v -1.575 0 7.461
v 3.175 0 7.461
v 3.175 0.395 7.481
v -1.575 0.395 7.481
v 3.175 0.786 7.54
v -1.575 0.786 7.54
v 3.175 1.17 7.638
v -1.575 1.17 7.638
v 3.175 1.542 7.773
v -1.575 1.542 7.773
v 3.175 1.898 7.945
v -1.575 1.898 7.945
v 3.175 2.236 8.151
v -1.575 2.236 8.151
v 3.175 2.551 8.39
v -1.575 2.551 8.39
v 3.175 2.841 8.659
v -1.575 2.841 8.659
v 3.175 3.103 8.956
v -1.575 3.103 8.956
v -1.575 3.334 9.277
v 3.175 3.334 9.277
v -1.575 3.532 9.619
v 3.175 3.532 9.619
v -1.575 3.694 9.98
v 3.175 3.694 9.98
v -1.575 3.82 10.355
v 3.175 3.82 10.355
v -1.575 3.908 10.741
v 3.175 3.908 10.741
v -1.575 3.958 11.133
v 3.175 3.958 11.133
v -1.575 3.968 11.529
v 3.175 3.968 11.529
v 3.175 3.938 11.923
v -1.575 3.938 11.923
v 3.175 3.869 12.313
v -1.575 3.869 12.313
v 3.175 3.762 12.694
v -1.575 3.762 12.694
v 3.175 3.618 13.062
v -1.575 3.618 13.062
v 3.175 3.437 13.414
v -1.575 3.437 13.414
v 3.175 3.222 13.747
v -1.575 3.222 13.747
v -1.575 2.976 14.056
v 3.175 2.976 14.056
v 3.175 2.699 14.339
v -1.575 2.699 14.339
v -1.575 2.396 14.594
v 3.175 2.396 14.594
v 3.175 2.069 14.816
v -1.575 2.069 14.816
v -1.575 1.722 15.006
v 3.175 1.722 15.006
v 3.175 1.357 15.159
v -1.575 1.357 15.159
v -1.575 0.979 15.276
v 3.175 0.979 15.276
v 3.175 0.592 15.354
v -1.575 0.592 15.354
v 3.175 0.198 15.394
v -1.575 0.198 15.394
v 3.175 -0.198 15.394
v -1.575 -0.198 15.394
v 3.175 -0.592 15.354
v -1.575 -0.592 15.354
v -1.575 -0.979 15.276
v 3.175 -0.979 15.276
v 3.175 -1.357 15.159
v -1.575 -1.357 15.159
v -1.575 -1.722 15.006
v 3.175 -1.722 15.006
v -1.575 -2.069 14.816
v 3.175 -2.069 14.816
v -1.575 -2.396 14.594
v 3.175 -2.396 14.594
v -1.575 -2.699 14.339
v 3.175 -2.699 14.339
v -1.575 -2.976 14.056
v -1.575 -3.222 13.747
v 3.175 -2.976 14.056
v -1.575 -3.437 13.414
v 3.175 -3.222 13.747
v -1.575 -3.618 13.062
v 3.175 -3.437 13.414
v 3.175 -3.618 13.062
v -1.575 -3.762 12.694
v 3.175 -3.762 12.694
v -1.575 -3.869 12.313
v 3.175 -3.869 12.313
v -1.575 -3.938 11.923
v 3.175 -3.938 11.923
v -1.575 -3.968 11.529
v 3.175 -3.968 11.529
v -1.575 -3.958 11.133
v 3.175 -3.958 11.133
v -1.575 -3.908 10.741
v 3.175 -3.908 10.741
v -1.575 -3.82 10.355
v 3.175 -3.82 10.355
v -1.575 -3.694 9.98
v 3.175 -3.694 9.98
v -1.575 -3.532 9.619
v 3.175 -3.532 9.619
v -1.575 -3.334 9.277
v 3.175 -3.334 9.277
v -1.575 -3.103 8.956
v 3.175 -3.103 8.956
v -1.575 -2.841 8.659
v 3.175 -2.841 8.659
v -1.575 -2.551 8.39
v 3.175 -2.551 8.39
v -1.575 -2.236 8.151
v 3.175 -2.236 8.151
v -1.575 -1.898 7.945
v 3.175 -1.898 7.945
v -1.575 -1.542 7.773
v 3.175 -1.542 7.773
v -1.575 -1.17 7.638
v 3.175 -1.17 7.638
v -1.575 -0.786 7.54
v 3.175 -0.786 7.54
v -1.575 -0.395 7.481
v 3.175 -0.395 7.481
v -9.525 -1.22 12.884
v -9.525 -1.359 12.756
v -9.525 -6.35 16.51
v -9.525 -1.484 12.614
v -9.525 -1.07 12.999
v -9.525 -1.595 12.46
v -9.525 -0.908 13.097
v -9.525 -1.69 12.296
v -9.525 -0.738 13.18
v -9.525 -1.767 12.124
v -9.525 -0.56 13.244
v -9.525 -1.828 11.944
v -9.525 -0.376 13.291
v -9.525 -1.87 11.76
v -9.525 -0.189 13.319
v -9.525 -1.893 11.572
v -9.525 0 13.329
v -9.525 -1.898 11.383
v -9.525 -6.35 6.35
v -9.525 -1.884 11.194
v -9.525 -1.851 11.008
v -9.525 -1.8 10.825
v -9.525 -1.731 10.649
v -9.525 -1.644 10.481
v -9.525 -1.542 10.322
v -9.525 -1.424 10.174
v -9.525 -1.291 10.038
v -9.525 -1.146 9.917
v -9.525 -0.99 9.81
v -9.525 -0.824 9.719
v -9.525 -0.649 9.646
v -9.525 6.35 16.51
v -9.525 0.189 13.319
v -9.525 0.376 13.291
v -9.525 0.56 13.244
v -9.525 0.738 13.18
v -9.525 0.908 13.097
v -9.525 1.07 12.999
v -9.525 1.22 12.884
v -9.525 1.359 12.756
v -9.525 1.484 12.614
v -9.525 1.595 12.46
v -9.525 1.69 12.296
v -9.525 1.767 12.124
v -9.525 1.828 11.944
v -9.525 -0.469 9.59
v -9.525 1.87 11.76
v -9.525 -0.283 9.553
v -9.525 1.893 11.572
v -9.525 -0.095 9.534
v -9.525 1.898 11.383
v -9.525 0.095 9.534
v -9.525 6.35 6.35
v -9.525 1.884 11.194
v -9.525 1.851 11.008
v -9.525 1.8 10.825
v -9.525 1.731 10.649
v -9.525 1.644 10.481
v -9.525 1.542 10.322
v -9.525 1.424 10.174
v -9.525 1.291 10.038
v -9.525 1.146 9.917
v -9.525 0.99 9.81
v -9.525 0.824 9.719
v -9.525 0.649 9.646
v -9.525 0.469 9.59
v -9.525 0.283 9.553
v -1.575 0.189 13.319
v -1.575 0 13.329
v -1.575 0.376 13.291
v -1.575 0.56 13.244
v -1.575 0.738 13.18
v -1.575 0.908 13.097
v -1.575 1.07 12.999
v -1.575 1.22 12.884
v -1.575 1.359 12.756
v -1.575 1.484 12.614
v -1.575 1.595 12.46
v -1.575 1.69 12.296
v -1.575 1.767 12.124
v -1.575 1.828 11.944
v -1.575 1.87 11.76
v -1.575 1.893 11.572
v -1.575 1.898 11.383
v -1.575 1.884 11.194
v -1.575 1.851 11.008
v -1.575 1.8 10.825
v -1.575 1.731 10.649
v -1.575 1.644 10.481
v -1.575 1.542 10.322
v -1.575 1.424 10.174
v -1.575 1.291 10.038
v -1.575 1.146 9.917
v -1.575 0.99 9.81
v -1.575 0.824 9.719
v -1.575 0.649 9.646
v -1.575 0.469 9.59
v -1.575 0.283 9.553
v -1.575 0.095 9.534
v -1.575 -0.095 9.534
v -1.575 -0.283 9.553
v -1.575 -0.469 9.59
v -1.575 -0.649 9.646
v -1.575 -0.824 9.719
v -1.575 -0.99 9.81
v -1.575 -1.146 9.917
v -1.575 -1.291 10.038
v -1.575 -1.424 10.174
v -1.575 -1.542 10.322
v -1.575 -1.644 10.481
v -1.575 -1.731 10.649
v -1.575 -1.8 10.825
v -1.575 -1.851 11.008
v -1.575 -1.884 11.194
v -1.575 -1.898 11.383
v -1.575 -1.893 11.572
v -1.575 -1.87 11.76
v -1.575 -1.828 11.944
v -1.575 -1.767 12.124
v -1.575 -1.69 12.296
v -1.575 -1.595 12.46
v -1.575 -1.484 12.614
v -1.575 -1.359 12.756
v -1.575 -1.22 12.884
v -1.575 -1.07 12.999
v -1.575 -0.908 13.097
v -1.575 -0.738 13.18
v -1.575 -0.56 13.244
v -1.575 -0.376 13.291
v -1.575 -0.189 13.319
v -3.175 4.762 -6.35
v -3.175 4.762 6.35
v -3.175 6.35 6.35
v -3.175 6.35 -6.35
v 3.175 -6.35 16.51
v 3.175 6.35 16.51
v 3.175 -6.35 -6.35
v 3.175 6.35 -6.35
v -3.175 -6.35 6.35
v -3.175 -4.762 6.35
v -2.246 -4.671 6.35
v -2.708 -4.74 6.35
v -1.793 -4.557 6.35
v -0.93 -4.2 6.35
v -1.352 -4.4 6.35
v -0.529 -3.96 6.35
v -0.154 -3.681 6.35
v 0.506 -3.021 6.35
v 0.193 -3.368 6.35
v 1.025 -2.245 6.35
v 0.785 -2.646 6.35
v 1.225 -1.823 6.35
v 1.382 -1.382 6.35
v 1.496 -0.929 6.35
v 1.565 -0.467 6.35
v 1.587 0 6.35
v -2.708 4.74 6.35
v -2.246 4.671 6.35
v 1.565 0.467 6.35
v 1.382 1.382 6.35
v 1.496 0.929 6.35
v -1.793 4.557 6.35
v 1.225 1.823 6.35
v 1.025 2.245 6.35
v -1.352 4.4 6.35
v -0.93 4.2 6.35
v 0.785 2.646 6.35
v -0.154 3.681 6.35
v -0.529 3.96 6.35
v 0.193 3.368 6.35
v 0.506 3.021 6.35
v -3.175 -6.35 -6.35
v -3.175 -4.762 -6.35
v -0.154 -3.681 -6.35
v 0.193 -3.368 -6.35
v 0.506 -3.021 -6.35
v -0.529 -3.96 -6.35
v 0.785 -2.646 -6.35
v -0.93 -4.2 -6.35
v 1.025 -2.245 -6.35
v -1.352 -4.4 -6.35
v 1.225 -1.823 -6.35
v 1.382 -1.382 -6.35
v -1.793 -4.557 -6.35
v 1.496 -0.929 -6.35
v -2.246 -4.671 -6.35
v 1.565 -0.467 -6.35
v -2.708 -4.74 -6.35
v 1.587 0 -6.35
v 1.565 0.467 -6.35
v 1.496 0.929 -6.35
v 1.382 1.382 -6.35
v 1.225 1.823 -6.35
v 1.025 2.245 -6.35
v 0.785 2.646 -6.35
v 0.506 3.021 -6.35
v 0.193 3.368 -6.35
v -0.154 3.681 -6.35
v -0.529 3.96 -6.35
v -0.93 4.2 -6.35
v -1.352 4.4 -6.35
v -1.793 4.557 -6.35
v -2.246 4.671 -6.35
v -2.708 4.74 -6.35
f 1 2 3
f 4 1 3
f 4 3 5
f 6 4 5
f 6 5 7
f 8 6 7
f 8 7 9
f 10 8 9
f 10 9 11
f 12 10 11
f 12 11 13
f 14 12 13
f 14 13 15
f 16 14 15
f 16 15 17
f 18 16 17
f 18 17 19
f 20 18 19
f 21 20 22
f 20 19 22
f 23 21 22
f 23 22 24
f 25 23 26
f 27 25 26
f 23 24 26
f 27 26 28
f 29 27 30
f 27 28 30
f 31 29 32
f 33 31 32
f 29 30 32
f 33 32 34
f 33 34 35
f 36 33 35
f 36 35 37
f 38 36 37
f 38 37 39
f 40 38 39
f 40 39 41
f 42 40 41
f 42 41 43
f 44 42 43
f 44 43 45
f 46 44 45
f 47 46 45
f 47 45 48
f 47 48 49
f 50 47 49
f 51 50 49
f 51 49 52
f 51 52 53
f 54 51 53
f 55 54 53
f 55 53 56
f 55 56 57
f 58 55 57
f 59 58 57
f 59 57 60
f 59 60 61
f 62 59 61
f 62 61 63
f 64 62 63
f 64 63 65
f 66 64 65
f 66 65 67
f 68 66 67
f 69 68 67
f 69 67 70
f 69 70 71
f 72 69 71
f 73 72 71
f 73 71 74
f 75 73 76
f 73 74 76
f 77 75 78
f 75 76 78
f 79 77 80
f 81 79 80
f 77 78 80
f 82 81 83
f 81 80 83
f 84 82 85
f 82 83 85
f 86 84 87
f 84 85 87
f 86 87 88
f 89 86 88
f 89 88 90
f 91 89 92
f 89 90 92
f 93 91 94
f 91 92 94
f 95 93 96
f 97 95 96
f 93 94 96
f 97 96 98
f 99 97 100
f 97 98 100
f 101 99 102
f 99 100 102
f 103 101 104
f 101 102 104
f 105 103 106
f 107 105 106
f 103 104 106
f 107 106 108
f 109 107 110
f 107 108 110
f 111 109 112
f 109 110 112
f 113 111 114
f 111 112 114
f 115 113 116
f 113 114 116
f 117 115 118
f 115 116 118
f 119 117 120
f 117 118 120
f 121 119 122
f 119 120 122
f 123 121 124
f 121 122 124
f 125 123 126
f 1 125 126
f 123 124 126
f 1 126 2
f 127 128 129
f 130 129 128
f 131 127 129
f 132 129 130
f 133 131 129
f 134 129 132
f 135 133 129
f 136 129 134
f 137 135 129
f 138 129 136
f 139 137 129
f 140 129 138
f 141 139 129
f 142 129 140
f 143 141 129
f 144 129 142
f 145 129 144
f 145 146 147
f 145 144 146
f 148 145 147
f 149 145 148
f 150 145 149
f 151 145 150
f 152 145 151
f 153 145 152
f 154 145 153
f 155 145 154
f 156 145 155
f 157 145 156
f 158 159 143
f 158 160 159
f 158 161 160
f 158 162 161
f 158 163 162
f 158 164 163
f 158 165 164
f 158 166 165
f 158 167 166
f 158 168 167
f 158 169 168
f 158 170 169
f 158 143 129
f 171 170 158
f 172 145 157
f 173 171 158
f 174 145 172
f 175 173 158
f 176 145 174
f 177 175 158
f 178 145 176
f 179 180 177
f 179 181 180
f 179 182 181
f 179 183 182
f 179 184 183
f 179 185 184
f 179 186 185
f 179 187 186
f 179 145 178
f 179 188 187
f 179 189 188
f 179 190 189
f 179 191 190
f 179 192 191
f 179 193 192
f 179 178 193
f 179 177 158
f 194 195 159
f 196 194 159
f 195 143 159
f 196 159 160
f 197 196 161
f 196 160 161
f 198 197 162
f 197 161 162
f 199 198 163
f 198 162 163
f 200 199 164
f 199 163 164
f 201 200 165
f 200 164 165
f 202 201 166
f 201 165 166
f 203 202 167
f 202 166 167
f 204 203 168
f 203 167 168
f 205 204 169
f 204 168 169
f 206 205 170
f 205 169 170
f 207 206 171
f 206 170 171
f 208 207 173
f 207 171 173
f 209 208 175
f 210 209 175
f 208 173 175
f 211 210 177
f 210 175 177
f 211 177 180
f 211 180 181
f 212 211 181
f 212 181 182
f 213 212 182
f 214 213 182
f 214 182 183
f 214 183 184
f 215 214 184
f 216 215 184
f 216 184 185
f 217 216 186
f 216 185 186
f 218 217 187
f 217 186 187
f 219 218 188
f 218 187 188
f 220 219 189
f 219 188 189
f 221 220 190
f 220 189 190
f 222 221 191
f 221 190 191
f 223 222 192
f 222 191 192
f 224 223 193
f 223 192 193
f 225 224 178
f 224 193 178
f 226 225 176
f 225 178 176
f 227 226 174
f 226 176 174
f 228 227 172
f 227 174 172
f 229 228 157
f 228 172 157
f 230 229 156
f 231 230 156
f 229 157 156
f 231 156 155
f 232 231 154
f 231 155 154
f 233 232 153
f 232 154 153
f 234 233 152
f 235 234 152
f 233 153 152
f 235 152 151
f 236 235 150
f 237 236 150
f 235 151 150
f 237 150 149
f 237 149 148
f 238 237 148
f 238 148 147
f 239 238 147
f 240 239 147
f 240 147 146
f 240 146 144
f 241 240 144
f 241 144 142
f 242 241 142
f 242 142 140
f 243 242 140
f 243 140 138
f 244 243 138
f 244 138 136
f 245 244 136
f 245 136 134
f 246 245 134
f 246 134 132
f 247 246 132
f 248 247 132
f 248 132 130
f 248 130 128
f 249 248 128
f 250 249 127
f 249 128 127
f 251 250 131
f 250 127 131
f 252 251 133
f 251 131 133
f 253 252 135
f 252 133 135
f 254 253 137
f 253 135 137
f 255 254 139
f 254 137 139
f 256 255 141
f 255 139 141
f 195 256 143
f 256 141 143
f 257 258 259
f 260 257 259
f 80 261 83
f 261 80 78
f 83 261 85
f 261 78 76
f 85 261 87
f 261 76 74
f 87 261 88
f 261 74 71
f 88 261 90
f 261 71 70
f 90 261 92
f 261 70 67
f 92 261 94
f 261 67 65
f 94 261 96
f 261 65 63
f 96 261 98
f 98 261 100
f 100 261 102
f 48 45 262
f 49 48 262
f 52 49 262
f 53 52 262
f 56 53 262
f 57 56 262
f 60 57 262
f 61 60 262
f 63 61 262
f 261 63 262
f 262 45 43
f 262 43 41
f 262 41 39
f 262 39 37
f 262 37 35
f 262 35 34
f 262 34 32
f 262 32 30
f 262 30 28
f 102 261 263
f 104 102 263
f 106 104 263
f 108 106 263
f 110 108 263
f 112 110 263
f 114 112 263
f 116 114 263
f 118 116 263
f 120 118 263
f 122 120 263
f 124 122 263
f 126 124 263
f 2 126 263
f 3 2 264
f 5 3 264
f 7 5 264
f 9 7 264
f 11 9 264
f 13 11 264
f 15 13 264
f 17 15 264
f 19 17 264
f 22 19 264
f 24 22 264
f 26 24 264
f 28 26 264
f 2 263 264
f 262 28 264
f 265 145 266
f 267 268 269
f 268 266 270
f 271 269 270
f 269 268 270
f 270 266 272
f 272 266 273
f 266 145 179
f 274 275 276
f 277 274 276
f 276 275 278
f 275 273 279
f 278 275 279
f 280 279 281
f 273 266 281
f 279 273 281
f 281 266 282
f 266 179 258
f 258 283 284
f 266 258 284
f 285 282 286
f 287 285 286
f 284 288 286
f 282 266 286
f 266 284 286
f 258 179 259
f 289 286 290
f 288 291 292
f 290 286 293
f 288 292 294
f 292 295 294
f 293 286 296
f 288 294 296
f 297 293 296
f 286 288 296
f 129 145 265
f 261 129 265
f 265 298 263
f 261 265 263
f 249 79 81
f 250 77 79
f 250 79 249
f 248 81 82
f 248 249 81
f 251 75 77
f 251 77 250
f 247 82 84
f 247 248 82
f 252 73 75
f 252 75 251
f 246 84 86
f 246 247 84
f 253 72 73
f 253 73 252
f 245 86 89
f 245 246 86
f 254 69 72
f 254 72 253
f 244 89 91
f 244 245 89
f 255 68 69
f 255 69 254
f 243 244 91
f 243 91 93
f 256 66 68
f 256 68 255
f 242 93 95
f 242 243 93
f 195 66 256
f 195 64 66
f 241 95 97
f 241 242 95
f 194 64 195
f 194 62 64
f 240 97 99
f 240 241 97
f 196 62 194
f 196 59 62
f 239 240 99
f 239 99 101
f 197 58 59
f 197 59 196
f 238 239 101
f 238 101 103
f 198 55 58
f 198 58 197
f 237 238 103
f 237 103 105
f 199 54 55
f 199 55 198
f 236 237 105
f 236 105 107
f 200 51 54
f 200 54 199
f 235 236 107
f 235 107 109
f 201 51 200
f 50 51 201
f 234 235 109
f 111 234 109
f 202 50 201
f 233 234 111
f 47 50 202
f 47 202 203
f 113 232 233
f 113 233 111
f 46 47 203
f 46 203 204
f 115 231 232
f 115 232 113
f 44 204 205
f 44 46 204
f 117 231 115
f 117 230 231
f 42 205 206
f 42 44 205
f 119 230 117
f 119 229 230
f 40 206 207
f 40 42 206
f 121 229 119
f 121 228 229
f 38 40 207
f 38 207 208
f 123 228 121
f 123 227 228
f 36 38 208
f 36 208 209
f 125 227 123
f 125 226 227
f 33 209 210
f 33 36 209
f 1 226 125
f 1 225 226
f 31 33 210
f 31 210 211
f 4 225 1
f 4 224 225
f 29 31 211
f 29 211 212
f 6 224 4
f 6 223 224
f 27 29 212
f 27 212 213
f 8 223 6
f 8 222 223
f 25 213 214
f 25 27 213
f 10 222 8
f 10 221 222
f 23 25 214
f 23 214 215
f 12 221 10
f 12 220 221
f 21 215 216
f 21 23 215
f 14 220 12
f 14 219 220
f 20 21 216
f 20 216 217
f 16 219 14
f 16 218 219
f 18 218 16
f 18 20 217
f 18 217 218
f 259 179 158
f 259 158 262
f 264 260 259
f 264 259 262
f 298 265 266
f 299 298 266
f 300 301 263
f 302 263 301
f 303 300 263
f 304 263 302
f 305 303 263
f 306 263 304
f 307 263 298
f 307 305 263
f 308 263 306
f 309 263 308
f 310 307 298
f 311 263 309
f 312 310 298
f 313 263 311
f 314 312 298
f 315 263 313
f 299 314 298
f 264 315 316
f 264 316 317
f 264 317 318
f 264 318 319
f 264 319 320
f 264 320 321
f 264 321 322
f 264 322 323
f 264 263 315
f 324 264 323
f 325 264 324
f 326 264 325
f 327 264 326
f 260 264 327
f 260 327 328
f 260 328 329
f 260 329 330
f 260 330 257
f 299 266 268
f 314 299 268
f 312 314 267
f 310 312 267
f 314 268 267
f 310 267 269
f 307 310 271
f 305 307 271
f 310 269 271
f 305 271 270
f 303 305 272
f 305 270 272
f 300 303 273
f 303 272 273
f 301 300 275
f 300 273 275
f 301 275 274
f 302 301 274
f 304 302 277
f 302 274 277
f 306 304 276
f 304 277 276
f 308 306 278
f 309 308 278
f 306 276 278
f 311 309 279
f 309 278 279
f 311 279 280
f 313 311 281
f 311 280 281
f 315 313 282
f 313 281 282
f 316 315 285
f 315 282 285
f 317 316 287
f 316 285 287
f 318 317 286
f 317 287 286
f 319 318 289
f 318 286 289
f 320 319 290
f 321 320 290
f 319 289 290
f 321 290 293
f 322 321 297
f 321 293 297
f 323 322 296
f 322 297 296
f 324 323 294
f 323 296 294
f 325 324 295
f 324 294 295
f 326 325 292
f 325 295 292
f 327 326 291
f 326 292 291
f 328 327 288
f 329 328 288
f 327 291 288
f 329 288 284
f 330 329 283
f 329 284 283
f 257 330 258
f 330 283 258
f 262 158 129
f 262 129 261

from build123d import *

# Parameters (mm, degrees)
BOSS_EXTRUDE1_DEPTH                                 = 6.35
SKETCH2_W                                           = 12.7
SKETCH2_H                                           = 12.7
BOSS_EXTRUDE2_DEPTH                                 = 10.16
CBORE_FOR_6_BINDING_HEAD_MACHINE_SCREW1_D           = 3.7973
CBORE_FOR_6_BINDING_HEAD_MACHINE_SCREW1_CBORE_D     = 7.9375
CBORE_FOR_6_BINDING_HEAD_MACHINE_SCREW1_CBORE_DEPTH = 4.7498


with BuildPart() as part:
    # Sketch1 → Boss-Extrude1 (new, symmetric)
    with BuildSketch(Plane.XY):
        with BuildLine():
            Line((-3.175, 4.7625), (-3.175, 6.35))
            Line((-3.175, 6.35), (3.175, 6.35))
            Line((3.175, 6.35), (3.175, -6.35))
            Line((3.175, -6.35), (-3.175, -6.35))
            Line((-3.175, -6.35), (-3.175, -4.7625))
            ThreePointArc((-3.175, -4.7625), (1.5875, 0), (-3.175, 4.7625))
        make_face()
    extrude(amount=BOSS_EXTRUDE1_DEPTH, both=True)

    # Sketch2 → Boss-Extrude2 (add)
    with BuildSketch(Plane.XY.offset(6.35)):
        with Locations((-3.175, 0)):
            Rectangle(SKETCH2_W, SKETCH2_H)
    extrude(amount=BOSS_EXTRUDE2_DEPTH)

    # CBORE for #6 Binding Head Machine Screw1 (through all)
    with Locations(Plane(origin=(3.175, 0, 0), x_dir=(0, 0, -1), z_dir=(1, 0, 0))):
        with Locations((-11.43, 0)):
            CounterBoreHole(CBORE_FOR_6_BINDING_HEAD_MACHINE_SCREW1_D / 2, CBORE_FOR_6_BINDING_HEAD_MACHINE_SCREW1_CBORE_D / 2, CBORE_FOR_6_BINDING_HEAD_MACHINE_SCREW1_CBORE_DEPTH)


solid = part.part
